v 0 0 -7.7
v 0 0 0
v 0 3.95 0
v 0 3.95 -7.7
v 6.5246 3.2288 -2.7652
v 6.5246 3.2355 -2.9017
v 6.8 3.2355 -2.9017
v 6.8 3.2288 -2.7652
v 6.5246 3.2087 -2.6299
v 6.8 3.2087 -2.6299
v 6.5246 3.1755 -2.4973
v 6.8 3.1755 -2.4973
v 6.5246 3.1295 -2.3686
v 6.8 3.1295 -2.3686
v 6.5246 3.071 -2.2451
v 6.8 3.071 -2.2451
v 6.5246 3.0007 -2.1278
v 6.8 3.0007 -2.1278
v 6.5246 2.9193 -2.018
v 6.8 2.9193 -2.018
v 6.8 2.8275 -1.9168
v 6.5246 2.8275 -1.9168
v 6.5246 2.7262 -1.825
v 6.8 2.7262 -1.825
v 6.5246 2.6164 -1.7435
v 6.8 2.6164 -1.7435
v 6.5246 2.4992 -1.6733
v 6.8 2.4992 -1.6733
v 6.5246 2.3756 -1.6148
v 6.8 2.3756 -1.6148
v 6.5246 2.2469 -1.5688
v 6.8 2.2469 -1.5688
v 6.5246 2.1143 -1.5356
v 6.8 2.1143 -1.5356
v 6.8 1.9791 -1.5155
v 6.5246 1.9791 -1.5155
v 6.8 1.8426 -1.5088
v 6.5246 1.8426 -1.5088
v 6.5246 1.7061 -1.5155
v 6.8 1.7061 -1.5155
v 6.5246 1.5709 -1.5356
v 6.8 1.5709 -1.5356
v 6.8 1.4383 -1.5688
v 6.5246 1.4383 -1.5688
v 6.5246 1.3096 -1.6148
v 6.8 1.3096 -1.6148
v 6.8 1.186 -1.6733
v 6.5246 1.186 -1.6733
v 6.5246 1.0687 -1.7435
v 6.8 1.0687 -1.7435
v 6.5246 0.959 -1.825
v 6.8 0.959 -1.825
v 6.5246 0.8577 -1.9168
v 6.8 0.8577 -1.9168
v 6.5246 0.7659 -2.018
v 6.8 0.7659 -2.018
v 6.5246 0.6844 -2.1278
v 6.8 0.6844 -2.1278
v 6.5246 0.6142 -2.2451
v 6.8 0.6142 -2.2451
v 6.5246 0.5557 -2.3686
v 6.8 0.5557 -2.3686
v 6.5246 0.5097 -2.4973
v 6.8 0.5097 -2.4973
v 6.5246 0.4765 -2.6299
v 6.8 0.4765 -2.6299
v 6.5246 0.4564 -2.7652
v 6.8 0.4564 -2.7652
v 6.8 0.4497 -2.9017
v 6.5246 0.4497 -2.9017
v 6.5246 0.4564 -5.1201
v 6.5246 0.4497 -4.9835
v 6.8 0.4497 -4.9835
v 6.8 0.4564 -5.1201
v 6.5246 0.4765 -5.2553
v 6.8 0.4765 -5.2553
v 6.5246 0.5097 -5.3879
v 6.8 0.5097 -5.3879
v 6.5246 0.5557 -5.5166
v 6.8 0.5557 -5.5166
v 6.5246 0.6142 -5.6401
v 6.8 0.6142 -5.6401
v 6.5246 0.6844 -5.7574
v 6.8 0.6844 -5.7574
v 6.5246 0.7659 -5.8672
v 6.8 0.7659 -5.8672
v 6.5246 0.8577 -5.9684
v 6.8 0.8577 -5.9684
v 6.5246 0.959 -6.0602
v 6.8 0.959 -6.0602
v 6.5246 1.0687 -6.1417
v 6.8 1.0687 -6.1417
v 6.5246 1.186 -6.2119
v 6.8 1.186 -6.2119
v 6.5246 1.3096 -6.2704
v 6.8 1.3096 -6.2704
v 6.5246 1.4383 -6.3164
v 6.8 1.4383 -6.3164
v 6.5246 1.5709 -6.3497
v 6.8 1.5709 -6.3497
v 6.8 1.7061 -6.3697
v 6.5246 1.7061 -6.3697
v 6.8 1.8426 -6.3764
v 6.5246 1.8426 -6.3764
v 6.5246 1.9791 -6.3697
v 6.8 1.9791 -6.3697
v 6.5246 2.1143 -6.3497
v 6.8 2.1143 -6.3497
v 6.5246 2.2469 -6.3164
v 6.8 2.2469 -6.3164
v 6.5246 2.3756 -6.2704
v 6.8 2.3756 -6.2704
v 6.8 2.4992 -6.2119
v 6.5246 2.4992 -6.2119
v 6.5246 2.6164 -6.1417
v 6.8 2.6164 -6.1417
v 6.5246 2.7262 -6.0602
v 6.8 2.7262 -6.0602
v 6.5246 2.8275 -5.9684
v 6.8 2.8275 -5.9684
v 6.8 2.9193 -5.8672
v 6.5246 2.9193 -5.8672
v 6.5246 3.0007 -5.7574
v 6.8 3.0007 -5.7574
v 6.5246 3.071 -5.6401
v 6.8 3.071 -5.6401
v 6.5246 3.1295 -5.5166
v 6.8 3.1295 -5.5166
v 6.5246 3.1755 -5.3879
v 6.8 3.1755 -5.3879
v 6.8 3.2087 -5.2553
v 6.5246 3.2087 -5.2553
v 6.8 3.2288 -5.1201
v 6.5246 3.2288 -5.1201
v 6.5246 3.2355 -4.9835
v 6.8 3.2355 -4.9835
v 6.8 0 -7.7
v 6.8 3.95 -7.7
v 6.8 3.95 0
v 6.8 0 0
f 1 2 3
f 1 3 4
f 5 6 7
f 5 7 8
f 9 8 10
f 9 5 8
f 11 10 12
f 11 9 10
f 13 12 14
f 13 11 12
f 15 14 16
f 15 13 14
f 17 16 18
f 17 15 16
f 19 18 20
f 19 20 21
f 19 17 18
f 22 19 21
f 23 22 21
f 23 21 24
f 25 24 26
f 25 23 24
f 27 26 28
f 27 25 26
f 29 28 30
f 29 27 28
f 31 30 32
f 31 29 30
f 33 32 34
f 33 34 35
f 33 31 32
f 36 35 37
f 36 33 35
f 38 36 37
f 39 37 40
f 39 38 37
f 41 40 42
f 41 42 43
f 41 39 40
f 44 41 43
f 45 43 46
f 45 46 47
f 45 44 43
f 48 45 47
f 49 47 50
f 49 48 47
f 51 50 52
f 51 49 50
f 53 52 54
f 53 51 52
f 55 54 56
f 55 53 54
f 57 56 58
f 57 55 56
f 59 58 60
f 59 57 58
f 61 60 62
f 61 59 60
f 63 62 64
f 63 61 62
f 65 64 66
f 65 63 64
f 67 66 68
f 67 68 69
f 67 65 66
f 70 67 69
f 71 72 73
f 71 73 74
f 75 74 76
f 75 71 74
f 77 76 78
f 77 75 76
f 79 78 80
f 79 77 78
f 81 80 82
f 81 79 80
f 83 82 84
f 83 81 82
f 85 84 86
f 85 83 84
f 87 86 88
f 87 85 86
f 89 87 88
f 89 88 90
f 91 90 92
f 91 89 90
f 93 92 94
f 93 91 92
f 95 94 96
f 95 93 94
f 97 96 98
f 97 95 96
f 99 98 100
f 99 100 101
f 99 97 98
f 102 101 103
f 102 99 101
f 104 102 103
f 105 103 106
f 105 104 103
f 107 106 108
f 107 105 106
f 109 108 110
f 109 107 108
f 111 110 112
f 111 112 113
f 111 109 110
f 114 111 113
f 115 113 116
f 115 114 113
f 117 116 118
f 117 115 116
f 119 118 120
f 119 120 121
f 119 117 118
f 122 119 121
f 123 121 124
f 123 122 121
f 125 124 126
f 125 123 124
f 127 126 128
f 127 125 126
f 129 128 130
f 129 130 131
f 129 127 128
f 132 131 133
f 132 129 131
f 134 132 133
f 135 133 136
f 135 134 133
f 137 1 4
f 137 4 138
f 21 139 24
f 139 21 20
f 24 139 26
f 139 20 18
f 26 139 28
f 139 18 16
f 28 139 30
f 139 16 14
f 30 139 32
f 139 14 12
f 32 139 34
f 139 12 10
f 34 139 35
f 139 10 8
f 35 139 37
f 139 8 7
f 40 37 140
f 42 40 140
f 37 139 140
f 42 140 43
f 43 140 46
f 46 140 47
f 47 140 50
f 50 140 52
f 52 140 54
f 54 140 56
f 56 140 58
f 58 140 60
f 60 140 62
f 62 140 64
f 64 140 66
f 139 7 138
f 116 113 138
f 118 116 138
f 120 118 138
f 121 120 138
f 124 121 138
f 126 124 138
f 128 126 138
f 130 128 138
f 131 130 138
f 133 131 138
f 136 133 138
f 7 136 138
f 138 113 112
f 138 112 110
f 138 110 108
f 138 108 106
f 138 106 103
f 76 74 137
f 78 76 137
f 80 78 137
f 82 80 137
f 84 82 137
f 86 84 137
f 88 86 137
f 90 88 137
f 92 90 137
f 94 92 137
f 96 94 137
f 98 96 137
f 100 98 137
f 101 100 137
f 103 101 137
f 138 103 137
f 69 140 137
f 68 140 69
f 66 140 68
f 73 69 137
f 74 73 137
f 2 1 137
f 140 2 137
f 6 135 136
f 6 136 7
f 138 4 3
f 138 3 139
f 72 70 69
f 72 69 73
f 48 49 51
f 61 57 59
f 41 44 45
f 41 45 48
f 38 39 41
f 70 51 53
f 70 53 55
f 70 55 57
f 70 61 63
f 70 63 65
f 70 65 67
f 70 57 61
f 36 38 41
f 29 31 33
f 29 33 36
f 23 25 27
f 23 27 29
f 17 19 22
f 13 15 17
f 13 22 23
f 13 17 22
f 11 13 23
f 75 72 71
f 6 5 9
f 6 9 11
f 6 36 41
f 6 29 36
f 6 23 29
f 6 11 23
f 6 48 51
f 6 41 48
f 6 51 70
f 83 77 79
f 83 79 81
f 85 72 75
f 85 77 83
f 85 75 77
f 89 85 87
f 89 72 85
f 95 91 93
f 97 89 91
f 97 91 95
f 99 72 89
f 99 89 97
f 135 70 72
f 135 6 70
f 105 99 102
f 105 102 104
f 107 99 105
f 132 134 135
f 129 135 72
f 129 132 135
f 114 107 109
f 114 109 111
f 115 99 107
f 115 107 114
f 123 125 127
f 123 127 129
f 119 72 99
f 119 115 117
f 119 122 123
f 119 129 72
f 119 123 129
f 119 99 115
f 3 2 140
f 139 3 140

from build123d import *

# Parameters (mm, degrees)
SKETCH1_W           = 6.8
SKETCH1_H           = 7.7
BOSS_EXTRUDE1_DEPTH = 3.95
CUT_EXTRUDE4_START  = -0.275354201
CUT_EXTRUDE4_DEPTH  = 0.275354201


# Read off the part's stored shape, not the designer's step: Cut-Extrude4
with BuildPart() as part:
    # Sketch1 → Boss-Extrude1 (new body)
    with BuildSketch(Plane(origin=(0, 0, 0), x_dir=(1, 0, 0), z_dir=(0, 1, 0))):
        with Locations((3.4, 3.85)):
            Rectangle(SKETCH1_W, SKETCH1_H)
    extrude(amount=BOSS_EXTRUDE1_DEPTH)

    # Cut-Extrude4 outline → Cut-Extrude4 (cut)
    with BuildSketch(Plane(origin=(6.8, 0, 0), x_dir=(0, 0, -1), z_dir=(1, 0, 0)).offset(CUT_EXTRUDE4_START)):
        with BuildLine():
            Line((4.98352639, 3.235480271), (2.901682517, 3.235480271))
            ThreePointArc((2.901682517, 3.235480271), (1.50879417, 1.842591924), (2.901682517, 0.449703578))
            Line((2.901682517, 0.449703578), (4.98352639, 0.449703578))
            ThreePointArc((4.98352639, 0.449703578), (6.376414736, 1.842591924), (4.98352639, 3.235480271))
        make_face()
    extrude(amount=CUT_EXTRUDE4_DEPTH, mode=Mode.SUBTRACT)


solid = part.part
